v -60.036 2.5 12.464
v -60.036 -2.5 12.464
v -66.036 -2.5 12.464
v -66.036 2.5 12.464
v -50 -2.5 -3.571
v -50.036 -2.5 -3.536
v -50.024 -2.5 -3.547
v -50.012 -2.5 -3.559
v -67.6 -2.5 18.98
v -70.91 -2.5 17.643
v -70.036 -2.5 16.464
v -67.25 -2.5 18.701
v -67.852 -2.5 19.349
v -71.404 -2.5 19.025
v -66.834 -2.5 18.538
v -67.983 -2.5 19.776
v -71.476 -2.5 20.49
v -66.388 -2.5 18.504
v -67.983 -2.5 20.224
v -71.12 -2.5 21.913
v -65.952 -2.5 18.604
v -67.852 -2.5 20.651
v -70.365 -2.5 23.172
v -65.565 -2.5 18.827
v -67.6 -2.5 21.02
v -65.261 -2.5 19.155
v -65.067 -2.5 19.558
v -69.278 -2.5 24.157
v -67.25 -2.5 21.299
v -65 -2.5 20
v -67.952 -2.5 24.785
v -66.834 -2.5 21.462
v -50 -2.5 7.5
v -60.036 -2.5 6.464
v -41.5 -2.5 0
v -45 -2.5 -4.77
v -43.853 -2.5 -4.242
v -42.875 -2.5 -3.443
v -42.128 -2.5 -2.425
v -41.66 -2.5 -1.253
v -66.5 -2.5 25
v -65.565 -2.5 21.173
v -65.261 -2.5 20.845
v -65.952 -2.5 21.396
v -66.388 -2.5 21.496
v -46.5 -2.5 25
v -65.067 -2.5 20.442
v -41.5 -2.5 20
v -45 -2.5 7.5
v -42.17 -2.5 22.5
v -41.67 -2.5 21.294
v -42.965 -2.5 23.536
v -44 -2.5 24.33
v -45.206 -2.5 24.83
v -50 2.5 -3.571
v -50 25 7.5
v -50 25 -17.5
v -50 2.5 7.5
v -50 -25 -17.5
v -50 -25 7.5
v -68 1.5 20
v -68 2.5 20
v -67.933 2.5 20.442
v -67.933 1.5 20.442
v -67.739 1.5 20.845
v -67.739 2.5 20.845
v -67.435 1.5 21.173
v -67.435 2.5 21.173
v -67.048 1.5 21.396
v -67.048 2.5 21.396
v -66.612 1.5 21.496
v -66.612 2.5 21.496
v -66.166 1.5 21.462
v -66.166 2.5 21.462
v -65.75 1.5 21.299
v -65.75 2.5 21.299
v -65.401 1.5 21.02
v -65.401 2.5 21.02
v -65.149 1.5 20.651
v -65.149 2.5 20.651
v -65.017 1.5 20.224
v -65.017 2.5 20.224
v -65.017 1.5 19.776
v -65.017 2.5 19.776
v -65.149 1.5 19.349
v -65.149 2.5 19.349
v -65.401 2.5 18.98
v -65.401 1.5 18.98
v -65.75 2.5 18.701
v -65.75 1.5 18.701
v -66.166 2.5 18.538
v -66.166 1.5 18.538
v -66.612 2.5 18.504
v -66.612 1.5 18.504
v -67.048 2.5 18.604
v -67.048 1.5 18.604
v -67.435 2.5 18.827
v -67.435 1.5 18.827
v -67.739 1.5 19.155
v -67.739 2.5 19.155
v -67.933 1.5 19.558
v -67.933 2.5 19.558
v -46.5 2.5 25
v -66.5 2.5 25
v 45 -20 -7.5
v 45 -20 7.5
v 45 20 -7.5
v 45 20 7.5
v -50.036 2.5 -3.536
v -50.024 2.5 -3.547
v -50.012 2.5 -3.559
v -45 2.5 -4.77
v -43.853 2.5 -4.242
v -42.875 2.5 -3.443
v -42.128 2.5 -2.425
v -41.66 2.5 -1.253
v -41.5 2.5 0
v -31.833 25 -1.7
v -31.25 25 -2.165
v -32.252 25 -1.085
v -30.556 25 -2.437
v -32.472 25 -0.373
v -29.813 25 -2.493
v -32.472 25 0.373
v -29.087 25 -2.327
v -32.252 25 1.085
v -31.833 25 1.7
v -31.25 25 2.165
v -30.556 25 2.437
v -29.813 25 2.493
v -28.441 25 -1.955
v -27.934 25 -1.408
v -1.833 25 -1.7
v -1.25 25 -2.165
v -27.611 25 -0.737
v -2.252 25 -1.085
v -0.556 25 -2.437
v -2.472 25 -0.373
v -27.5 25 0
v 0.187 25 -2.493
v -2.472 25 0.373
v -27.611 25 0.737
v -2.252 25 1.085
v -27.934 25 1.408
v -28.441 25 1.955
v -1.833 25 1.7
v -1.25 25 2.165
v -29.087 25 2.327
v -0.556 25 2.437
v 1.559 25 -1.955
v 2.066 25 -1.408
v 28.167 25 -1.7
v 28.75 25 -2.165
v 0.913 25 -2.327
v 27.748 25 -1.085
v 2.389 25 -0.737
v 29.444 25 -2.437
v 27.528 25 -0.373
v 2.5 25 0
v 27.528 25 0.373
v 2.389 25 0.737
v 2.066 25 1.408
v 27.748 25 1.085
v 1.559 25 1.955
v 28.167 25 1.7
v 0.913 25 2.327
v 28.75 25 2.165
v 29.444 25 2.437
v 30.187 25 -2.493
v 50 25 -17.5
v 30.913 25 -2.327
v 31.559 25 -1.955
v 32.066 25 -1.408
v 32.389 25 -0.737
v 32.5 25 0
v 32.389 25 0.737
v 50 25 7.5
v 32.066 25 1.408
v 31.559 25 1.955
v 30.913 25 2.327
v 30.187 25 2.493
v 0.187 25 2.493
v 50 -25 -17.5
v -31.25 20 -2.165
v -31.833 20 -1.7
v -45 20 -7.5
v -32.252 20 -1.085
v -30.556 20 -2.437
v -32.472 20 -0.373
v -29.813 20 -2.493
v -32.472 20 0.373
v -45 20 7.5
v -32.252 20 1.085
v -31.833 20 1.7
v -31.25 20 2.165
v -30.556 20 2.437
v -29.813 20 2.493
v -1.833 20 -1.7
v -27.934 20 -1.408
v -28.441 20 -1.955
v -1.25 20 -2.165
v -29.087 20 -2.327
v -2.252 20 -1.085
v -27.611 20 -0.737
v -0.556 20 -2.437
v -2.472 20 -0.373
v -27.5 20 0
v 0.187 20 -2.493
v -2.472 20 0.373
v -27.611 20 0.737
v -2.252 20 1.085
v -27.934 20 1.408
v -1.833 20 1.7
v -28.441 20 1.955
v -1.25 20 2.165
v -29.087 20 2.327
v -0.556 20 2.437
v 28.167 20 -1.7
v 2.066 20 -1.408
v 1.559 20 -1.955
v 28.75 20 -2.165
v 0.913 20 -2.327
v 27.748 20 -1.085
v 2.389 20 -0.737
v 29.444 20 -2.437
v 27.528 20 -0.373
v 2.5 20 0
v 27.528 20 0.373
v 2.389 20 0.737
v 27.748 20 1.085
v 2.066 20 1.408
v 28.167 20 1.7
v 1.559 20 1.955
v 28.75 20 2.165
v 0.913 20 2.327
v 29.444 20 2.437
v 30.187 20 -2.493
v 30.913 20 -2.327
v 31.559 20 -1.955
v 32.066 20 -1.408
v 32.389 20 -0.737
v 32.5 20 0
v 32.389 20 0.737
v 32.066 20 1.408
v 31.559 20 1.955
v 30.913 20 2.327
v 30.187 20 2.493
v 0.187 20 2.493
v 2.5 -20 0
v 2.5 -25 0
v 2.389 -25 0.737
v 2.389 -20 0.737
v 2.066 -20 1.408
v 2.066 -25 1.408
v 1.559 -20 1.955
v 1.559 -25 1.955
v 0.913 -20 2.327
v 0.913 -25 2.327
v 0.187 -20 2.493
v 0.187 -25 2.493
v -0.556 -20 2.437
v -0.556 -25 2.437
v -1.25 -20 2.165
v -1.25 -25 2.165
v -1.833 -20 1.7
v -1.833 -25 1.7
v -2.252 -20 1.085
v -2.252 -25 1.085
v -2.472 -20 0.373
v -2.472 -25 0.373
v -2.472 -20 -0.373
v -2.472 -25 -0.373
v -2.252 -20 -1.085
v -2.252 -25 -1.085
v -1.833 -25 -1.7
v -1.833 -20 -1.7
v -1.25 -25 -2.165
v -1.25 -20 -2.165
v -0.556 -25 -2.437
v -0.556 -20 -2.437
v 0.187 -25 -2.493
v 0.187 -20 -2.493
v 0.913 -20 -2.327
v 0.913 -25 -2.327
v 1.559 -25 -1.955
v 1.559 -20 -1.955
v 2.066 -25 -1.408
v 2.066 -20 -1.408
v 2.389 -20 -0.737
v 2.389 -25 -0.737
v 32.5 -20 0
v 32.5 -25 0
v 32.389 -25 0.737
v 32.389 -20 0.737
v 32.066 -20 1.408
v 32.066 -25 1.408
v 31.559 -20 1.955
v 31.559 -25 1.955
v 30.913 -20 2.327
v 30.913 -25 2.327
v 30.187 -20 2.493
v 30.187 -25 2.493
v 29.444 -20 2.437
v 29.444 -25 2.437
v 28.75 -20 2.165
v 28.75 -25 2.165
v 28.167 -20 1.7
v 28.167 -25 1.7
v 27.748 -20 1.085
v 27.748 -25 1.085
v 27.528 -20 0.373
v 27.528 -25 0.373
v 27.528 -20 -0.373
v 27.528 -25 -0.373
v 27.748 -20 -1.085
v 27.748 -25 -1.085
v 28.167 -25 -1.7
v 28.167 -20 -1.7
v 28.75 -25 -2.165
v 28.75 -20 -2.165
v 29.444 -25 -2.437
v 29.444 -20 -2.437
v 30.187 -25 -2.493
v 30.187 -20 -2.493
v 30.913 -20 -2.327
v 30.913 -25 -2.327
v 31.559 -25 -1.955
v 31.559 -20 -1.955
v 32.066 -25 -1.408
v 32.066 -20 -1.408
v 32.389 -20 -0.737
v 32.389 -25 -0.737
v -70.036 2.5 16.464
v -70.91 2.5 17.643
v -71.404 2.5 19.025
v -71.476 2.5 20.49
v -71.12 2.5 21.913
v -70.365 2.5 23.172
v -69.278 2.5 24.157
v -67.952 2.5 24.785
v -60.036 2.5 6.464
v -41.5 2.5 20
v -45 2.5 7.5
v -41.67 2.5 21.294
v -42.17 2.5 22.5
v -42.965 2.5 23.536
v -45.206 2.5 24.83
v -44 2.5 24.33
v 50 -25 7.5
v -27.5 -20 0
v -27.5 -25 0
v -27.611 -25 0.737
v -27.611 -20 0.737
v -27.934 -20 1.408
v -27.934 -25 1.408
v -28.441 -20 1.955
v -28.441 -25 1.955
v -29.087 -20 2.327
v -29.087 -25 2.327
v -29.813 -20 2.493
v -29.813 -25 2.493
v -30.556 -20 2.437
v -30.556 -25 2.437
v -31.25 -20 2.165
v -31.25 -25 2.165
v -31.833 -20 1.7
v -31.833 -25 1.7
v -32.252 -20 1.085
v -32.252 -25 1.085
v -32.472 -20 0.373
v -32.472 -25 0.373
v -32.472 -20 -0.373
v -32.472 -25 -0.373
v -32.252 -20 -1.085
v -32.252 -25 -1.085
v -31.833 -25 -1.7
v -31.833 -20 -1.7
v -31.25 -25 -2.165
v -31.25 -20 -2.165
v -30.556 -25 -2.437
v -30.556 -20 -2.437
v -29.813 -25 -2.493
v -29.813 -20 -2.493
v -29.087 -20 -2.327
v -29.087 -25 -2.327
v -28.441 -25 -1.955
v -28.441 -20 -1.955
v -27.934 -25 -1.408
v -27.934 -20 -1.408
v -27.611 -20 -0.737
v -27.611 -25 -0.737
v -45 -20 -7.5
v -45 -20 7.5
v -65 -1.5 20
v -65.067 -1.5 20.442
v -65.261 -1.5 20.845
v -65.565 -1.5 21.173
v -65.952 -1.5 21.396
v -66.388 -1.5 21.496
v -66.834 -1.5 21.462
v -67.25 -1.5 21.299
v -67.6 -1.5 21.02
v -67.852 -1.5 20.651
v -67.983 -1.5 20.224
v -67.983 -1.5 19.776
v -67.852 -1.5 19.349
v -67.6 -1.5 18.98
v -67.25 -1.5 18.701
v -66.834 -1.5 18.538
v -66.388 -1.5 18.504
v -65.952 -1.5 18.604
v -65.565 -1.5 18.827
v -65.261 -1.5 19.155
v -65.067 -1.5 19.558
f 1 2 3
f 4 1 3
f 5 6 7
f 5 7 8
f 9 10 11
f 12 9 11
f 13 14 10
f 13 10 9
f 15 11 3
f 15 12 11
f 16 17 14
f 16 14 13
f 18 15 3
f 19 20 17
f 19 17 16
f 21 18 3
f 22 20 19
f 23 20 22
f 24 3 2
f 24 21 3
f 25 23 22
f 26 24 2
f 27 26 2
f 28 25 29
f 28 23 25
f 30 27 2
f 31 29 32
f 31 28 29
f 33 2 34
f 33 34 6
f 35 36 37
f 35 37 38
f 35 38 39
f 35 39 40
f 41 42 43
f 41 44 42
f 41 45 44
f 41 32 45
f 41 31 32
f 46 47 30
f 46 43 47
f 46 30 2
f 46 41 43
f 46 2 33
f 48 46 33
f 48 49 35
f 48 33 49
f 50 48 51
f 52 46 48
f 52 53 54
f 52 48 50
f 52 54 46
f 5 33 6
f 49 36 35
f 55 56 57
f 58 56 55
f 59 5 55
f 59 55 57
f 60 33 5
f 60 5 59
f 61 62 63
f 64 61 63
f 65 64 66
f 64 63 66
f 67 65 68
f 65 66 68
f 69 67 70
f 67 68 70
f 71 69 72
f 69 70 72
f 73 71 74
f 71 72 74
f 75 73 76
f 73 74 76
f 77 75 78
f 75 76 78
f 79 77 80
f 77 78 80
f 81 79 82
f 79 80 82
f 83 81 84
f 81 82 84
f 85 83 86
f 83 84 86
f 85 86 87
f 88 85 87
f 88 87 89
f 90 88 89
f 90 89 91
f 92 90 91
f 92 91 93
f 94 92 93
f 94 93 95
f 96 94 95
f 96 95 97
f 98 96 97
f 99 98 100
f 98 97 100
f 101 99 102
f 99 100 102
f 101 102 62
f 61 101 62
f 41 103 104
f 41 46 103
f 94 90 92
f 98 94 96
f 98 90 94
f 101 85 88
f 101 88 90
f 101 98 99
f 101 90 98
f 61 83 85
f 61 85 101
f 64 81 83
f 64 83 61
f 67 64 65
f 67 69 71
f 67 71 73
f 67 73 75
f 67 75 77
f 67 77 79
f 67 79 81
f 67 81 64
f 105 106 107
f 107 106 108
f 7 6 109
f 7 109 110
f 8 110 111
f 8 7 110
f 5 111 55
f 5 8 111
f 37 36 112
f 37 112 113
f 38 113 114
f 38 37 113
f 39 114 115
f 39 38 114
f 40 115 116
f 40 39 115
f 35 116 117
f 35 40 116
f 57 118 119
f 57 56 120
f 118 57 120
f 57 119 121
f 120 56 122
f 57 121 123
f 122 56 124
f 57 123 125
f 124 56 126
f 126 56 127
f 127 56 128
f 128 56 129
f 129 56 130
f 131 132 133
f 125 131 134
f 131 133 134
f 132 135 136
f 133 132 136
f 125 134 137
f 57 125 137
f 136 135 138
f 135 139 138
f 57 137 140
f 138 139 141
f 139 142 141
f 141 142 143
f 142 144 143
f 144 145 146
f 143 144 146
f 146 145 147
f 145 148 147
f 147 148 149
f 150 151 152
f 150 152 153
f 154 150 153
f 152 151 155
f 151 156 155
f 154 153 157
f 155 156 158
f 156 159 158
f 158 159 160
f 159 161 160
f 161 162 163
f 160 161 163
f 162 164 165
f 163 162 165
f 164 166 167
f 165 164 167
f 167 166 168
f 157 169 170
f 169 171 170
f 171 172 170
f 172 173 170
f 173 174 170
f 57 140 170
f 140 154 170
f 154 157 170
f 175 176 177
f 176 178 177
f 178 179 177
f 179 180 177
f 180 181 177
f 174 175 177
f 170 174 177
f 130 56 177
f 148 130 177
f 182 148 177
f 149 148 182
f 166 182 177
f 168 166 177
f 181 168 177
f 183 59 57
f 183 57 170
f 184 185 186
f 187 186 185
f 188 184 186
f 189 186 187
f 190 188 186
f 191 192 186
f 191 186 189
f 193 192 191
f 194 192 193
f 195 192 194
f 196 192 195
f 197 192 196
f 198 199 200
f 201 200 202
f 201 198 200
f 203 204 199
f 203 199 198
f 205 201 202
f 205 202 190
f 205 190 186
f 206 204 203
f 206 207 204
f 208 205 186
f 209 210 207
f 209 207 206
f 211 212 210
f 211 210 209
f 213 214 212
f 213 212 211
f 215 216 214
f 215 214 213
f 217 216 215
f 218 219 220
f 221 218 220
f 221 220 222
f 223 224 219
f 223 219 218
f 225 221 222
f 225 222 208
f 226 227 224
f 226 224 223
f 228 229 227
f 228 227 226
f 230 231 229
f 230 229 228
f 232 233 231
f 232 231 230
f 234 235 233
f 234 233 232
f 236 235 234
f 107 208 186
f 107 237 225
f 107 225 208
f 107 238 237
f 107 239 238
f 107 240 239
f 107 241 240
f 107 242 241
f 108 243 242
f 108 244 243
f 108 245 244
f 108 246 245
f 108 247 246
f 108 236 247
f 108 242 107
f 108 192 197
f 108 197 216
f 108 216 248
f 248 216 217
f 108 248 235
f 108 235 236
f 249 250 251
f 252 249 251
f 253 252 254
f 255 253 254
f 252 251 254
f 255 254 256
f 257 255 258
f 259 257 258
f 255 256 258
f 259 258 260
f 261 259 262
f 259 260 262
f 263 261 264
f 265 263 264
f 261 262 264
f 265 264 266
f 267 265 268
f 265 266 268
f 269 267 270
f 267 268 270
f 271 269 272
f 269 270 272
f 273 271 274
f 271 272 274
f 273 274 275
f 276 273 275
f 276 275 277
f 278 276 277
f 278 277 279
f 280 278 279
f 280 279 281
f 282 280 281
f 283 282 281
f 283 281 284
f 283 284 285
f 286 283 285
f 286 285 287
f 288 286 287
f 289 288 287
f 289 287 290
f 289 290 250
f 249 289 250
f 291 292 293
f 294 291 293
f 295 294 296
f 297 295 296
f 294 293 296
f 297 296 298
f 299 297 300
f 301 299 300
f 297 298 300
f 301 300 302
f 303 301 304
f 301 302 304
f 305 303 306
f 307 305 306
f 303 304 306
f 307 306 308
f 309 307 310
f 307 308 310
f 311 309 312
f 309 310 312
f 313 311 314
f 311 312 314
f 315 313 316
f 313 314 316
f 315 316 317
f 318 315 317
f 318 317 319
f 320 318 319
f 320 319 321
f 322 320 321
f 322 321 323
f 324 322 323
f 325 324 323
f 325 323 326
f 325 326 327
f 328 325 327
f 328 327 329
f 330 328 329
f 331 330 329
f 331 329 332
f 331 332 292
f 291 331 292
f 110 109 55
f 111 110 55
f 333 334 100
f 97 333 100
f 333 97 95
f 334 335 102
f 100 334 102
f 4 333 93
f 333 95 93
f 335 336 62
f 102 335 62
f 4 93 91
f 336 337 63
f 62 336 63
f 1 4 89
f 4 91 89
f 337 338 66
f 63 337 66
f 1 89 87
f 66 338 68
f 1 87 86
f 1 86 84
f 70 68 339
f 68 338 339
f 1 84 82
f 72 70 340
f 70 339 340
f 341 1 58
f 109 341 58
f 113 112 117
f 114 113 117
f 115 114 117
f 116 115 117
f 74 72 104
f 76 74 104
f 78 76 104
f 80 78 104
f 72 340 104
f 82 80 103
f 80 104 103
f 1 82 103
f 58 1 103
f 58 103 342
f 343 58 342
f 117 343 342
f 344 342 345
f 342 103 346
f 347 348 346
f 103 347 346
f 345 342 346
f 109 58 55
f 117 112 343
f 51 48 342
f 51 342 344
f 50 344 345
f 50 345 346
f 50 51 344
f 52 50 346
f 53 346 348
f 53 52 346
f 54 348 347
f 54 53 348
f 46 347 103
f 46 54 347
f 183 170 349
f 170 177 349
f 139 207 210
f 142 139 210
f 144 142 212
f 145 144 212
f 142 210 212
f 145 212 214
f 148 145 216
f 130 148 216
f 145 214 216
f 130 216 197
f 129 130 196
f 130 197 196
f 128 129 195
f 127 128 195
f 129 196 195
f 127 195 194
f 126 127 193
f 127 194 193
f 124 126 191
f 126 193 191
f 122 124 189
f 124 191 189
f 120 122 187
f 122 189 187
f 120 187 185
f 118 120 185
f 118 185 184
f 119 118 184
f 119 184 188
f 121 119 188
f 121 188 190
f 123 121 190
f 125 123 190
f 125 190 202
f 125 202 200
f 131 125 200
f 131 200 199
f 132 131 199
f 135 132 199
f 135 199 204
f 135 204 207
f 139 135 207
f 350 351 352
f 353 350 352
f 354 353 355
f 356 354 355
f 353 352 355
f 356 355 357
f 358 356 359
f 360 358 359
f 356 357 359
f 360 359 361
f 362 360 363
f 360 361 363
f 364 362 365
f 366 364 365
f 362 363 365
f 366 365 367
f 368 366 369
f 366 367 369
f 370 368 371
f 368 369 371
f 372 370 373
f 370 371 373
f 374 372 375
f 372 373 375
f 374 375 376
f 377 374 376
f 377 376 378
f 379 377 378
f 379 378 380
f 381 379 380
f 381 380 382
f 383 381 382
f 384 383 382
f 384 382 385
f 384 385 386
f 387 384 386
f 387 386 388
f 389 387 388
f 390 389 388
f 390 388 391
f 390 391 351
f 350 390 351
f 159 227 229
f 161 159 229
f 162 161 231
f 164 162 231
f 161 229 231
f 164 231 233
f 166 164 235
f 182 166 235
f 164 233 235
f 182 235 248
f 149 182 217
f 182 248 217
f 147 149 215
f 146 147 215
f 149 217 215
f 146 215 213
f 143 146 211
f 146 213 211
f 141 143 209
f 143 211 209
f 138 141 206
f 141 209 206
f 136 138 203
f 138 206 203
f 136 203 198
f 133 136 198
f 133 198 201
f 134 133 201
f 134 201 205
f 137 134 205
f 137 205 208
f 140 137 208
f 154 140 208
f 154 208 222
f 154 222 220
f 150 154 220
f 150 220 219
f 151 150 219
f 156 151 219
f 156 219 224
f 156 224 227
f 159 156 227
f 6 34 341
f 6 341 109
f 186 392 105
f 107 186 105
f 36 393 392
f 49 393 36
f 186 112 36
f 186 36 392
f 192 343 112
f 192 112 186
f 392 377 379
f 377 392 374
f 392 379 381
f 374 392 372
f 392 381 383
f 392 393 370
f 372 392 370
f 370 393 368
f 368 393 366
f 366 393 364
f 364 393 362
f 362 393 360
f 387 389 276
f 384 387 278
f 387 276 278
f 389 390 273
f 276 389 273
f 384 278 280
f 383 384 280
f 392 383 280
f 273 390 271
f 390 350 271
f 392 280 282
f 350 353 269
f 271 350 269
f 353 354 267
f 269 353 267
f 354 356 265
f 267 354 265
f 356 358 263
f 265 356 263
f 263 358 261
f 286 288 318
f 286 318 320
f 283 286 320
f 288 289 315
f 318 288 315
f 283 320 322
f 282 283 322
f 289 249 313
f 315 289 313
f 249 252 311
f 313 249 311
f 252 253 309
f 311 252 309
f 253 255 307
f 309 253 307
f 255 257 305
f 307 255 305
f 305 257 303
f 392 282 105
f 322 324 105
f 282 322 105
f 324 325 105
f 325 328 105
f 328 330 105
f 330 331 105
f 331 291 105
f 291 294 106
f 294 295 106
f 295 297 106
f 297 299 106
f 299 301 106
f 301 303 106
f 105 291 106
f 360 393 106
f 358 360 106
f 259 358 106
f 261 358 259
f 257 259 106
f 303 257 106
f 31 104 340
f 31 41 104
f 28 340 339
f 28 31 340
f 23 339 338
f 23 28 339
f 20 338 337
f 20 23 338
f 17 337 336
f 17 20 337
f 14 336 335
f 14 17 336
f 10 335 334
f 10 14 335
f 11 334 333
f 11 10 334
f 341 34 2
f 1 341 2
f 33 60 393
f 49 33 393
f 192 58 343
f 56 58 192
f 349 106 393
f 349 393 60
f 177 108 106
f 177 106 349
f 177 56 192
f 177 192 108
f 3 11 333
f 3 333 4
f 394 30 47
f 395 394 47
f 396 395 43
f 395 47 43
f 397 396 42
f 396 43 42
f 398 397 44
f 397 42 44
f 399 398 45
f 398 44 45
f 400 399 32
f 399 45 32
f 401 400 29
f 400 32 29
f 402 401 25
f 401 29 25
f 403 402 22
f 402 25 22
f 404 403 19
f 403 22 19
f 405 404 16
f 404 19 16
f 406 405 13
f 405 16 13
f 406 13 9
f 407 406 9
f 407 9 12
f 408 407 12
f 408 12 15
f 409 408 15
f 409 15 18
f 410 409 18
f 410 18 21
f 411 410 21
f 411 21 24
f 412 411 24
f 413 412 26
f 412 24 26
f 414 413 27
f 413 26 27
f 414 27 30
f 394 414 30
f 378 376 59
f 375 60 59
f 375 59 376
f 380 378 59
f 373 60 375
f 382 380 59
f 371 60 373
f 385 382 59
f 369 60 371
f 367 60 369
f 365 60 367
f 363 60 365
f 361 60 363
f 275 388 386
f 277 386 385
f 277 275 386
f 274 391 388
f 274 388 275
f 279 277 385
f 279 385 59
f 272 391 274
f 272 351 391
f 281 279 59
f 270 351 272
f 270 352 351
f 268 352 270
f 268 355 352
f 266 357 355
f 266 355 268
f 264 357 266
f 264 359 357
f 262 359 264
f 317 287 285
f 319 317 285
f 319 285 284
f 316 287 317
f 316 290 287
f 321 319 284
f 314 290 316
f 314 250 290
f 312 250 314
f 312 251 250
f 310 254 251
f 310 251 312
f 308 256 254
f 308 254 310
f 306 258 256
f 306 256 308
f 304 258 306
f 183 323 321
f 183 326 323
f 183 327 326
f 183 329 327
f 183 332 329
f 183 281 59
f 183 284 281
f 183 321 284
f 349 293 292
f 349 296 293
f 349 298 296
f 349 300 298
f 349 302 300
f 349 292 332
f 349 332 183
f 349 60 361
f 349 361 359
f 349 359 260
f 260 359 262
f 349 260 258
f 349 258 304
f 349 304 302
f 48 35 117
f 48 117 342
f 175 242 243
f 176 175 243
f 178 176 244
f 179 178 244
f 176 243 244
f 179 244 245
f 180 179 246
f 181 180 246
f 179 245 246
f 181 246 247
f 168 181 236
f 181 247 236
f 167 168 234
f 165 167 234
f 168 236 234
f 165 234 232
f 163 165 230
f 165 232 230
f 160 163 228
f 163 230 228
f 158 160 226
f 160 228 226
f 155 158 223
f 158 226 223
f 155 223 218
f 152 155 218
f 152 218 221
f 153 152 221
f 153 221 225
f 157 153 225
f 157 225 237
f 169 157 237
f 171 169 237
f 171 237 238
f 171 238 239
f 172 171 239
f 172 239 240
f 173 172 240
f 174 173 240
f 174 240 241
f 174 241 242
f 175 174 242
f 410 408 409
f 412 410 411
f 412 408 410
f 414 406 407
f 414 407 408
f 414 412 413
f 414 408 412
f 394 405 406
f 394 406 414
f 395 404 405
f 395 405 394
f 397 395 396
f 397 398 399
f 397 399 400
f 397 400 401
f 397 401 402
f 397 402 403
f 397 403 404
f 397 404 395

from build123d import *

# Parameters (mm, degrees)
F0_W      = 100
F0_H      = 50
F0_W_2    = 90
F0_H_2    = 40
F1_DEPTH  = 7.5
F2_R      = 2.5
F3_DEPTH  = 50.001
F4_W      = 100
F4_H      = 50
F4_W_2    = 90
F4_H_2    = 40
F5_DEPTH  = 10
F7_DEPTH  = 2.5
F8_R      = 1.5
F9_DEPTH  = 1
F10_R     = 1.5
F11_DEPTH = 1
F13_DEPTH = 27.501


with BuildPart() as f1:
    # F0 (on Top) → F1 (new body, symmetric)
    with BuildSketch(Plane.XY):
        Rectangle(F0_W, F0_H)
        Rectangle(F0_W_2, F0_H_2, mode=Mode.SUBTRACT)
    extrude(amount=F1_DEPTH, both=True)

    # F2 (on face) → F3 (cut, through all)
    with BuildSketch(Plane.XZ.offset(25)):
        Circle(F2_R)
        with Locations((-30, 0)):
            Circle(F2_R)
        with Locations((30, 0)):
            Circle(F2_R)
    extrude(amount=-F3_DEPTH, mode=Mode.SUBTRACT)

    # F4 (on face) → F5 (join)
    with BuildSketch(Plane(origin=(0, 0, -7.5), x_dir=(1, 0, 0), z_dir=(0, 0, -1))):
        Rectangle(F4_W, F4_H)
        Rectangle(F4_W_2, F4_H_2, mode=Mode.SUBTRACT)
        Rectangle(F4_W_2, F4_H_2)
    extrude(amount=F5_DEPTH)

    # F6 (on Front) → F7 (join, symmetric)
    with BuildSketch(Plane.XZ):
        with BuildLine():
            Line((-70.0356467673, 16.4644660941), (-50.0356467673, -3.5355339059))
            ThreePointArc((-50.0356467673, -3.5355339059), (-44.5866956996, -4.6193976626), (-41.5001128614, 0))
            Line((-41.5001128614, 0), (-41.5001128614, 20))
            ThreePointArc((-41.5001128614, 20), (-42.9645789555, 23.5355339059), (-46.5001128614, 25))
            Line((-46.5001128614, 25), (-66.5001128614, 25))
            ThreePointArc((-66.5001128614, 25), (-71.119510524, 21.9134171618), (-70.0356467673, 16.4644660941))
        make_face()
    extrude(amount=F7_DEPTH, both=True)

    # F8 (on face) → F9 (cut)
    with BuildSketch(Plane.XZ.offset(2.5)):
        with Locations((-66.5001128614, 20)):
            Circle(F8_R)
    extrude(amount=-F9_DEPTH, mode=Mode.SUBTRACT)

    # F10 (on face) → F11 (cut)
    with BuildSketch(Plane(origin=(0, 2.5, 0), x_dir=(-1, 0, 0), z_dir=(0, 1, 0))):
        with Locations((66.5001128614, 20)):
            Circle(F10_R)
    extrude(amount=-F11_DEPTH, mode=Mode.SUBTRACT)

    # F12 (on face) → F13 (cut, through all)
    with BuildSketch(Plane.XZ.offset(2.5)):
        Polygon((-60.0356467673, 12.4644660941), (-66.0356467673, 12.4644660941), (-60.0356467673, 6.4644660941), align=None)
    extrude(amount=-F13_DEPTH, mode=Mode.SUBTRACT)


solid = f1.part
